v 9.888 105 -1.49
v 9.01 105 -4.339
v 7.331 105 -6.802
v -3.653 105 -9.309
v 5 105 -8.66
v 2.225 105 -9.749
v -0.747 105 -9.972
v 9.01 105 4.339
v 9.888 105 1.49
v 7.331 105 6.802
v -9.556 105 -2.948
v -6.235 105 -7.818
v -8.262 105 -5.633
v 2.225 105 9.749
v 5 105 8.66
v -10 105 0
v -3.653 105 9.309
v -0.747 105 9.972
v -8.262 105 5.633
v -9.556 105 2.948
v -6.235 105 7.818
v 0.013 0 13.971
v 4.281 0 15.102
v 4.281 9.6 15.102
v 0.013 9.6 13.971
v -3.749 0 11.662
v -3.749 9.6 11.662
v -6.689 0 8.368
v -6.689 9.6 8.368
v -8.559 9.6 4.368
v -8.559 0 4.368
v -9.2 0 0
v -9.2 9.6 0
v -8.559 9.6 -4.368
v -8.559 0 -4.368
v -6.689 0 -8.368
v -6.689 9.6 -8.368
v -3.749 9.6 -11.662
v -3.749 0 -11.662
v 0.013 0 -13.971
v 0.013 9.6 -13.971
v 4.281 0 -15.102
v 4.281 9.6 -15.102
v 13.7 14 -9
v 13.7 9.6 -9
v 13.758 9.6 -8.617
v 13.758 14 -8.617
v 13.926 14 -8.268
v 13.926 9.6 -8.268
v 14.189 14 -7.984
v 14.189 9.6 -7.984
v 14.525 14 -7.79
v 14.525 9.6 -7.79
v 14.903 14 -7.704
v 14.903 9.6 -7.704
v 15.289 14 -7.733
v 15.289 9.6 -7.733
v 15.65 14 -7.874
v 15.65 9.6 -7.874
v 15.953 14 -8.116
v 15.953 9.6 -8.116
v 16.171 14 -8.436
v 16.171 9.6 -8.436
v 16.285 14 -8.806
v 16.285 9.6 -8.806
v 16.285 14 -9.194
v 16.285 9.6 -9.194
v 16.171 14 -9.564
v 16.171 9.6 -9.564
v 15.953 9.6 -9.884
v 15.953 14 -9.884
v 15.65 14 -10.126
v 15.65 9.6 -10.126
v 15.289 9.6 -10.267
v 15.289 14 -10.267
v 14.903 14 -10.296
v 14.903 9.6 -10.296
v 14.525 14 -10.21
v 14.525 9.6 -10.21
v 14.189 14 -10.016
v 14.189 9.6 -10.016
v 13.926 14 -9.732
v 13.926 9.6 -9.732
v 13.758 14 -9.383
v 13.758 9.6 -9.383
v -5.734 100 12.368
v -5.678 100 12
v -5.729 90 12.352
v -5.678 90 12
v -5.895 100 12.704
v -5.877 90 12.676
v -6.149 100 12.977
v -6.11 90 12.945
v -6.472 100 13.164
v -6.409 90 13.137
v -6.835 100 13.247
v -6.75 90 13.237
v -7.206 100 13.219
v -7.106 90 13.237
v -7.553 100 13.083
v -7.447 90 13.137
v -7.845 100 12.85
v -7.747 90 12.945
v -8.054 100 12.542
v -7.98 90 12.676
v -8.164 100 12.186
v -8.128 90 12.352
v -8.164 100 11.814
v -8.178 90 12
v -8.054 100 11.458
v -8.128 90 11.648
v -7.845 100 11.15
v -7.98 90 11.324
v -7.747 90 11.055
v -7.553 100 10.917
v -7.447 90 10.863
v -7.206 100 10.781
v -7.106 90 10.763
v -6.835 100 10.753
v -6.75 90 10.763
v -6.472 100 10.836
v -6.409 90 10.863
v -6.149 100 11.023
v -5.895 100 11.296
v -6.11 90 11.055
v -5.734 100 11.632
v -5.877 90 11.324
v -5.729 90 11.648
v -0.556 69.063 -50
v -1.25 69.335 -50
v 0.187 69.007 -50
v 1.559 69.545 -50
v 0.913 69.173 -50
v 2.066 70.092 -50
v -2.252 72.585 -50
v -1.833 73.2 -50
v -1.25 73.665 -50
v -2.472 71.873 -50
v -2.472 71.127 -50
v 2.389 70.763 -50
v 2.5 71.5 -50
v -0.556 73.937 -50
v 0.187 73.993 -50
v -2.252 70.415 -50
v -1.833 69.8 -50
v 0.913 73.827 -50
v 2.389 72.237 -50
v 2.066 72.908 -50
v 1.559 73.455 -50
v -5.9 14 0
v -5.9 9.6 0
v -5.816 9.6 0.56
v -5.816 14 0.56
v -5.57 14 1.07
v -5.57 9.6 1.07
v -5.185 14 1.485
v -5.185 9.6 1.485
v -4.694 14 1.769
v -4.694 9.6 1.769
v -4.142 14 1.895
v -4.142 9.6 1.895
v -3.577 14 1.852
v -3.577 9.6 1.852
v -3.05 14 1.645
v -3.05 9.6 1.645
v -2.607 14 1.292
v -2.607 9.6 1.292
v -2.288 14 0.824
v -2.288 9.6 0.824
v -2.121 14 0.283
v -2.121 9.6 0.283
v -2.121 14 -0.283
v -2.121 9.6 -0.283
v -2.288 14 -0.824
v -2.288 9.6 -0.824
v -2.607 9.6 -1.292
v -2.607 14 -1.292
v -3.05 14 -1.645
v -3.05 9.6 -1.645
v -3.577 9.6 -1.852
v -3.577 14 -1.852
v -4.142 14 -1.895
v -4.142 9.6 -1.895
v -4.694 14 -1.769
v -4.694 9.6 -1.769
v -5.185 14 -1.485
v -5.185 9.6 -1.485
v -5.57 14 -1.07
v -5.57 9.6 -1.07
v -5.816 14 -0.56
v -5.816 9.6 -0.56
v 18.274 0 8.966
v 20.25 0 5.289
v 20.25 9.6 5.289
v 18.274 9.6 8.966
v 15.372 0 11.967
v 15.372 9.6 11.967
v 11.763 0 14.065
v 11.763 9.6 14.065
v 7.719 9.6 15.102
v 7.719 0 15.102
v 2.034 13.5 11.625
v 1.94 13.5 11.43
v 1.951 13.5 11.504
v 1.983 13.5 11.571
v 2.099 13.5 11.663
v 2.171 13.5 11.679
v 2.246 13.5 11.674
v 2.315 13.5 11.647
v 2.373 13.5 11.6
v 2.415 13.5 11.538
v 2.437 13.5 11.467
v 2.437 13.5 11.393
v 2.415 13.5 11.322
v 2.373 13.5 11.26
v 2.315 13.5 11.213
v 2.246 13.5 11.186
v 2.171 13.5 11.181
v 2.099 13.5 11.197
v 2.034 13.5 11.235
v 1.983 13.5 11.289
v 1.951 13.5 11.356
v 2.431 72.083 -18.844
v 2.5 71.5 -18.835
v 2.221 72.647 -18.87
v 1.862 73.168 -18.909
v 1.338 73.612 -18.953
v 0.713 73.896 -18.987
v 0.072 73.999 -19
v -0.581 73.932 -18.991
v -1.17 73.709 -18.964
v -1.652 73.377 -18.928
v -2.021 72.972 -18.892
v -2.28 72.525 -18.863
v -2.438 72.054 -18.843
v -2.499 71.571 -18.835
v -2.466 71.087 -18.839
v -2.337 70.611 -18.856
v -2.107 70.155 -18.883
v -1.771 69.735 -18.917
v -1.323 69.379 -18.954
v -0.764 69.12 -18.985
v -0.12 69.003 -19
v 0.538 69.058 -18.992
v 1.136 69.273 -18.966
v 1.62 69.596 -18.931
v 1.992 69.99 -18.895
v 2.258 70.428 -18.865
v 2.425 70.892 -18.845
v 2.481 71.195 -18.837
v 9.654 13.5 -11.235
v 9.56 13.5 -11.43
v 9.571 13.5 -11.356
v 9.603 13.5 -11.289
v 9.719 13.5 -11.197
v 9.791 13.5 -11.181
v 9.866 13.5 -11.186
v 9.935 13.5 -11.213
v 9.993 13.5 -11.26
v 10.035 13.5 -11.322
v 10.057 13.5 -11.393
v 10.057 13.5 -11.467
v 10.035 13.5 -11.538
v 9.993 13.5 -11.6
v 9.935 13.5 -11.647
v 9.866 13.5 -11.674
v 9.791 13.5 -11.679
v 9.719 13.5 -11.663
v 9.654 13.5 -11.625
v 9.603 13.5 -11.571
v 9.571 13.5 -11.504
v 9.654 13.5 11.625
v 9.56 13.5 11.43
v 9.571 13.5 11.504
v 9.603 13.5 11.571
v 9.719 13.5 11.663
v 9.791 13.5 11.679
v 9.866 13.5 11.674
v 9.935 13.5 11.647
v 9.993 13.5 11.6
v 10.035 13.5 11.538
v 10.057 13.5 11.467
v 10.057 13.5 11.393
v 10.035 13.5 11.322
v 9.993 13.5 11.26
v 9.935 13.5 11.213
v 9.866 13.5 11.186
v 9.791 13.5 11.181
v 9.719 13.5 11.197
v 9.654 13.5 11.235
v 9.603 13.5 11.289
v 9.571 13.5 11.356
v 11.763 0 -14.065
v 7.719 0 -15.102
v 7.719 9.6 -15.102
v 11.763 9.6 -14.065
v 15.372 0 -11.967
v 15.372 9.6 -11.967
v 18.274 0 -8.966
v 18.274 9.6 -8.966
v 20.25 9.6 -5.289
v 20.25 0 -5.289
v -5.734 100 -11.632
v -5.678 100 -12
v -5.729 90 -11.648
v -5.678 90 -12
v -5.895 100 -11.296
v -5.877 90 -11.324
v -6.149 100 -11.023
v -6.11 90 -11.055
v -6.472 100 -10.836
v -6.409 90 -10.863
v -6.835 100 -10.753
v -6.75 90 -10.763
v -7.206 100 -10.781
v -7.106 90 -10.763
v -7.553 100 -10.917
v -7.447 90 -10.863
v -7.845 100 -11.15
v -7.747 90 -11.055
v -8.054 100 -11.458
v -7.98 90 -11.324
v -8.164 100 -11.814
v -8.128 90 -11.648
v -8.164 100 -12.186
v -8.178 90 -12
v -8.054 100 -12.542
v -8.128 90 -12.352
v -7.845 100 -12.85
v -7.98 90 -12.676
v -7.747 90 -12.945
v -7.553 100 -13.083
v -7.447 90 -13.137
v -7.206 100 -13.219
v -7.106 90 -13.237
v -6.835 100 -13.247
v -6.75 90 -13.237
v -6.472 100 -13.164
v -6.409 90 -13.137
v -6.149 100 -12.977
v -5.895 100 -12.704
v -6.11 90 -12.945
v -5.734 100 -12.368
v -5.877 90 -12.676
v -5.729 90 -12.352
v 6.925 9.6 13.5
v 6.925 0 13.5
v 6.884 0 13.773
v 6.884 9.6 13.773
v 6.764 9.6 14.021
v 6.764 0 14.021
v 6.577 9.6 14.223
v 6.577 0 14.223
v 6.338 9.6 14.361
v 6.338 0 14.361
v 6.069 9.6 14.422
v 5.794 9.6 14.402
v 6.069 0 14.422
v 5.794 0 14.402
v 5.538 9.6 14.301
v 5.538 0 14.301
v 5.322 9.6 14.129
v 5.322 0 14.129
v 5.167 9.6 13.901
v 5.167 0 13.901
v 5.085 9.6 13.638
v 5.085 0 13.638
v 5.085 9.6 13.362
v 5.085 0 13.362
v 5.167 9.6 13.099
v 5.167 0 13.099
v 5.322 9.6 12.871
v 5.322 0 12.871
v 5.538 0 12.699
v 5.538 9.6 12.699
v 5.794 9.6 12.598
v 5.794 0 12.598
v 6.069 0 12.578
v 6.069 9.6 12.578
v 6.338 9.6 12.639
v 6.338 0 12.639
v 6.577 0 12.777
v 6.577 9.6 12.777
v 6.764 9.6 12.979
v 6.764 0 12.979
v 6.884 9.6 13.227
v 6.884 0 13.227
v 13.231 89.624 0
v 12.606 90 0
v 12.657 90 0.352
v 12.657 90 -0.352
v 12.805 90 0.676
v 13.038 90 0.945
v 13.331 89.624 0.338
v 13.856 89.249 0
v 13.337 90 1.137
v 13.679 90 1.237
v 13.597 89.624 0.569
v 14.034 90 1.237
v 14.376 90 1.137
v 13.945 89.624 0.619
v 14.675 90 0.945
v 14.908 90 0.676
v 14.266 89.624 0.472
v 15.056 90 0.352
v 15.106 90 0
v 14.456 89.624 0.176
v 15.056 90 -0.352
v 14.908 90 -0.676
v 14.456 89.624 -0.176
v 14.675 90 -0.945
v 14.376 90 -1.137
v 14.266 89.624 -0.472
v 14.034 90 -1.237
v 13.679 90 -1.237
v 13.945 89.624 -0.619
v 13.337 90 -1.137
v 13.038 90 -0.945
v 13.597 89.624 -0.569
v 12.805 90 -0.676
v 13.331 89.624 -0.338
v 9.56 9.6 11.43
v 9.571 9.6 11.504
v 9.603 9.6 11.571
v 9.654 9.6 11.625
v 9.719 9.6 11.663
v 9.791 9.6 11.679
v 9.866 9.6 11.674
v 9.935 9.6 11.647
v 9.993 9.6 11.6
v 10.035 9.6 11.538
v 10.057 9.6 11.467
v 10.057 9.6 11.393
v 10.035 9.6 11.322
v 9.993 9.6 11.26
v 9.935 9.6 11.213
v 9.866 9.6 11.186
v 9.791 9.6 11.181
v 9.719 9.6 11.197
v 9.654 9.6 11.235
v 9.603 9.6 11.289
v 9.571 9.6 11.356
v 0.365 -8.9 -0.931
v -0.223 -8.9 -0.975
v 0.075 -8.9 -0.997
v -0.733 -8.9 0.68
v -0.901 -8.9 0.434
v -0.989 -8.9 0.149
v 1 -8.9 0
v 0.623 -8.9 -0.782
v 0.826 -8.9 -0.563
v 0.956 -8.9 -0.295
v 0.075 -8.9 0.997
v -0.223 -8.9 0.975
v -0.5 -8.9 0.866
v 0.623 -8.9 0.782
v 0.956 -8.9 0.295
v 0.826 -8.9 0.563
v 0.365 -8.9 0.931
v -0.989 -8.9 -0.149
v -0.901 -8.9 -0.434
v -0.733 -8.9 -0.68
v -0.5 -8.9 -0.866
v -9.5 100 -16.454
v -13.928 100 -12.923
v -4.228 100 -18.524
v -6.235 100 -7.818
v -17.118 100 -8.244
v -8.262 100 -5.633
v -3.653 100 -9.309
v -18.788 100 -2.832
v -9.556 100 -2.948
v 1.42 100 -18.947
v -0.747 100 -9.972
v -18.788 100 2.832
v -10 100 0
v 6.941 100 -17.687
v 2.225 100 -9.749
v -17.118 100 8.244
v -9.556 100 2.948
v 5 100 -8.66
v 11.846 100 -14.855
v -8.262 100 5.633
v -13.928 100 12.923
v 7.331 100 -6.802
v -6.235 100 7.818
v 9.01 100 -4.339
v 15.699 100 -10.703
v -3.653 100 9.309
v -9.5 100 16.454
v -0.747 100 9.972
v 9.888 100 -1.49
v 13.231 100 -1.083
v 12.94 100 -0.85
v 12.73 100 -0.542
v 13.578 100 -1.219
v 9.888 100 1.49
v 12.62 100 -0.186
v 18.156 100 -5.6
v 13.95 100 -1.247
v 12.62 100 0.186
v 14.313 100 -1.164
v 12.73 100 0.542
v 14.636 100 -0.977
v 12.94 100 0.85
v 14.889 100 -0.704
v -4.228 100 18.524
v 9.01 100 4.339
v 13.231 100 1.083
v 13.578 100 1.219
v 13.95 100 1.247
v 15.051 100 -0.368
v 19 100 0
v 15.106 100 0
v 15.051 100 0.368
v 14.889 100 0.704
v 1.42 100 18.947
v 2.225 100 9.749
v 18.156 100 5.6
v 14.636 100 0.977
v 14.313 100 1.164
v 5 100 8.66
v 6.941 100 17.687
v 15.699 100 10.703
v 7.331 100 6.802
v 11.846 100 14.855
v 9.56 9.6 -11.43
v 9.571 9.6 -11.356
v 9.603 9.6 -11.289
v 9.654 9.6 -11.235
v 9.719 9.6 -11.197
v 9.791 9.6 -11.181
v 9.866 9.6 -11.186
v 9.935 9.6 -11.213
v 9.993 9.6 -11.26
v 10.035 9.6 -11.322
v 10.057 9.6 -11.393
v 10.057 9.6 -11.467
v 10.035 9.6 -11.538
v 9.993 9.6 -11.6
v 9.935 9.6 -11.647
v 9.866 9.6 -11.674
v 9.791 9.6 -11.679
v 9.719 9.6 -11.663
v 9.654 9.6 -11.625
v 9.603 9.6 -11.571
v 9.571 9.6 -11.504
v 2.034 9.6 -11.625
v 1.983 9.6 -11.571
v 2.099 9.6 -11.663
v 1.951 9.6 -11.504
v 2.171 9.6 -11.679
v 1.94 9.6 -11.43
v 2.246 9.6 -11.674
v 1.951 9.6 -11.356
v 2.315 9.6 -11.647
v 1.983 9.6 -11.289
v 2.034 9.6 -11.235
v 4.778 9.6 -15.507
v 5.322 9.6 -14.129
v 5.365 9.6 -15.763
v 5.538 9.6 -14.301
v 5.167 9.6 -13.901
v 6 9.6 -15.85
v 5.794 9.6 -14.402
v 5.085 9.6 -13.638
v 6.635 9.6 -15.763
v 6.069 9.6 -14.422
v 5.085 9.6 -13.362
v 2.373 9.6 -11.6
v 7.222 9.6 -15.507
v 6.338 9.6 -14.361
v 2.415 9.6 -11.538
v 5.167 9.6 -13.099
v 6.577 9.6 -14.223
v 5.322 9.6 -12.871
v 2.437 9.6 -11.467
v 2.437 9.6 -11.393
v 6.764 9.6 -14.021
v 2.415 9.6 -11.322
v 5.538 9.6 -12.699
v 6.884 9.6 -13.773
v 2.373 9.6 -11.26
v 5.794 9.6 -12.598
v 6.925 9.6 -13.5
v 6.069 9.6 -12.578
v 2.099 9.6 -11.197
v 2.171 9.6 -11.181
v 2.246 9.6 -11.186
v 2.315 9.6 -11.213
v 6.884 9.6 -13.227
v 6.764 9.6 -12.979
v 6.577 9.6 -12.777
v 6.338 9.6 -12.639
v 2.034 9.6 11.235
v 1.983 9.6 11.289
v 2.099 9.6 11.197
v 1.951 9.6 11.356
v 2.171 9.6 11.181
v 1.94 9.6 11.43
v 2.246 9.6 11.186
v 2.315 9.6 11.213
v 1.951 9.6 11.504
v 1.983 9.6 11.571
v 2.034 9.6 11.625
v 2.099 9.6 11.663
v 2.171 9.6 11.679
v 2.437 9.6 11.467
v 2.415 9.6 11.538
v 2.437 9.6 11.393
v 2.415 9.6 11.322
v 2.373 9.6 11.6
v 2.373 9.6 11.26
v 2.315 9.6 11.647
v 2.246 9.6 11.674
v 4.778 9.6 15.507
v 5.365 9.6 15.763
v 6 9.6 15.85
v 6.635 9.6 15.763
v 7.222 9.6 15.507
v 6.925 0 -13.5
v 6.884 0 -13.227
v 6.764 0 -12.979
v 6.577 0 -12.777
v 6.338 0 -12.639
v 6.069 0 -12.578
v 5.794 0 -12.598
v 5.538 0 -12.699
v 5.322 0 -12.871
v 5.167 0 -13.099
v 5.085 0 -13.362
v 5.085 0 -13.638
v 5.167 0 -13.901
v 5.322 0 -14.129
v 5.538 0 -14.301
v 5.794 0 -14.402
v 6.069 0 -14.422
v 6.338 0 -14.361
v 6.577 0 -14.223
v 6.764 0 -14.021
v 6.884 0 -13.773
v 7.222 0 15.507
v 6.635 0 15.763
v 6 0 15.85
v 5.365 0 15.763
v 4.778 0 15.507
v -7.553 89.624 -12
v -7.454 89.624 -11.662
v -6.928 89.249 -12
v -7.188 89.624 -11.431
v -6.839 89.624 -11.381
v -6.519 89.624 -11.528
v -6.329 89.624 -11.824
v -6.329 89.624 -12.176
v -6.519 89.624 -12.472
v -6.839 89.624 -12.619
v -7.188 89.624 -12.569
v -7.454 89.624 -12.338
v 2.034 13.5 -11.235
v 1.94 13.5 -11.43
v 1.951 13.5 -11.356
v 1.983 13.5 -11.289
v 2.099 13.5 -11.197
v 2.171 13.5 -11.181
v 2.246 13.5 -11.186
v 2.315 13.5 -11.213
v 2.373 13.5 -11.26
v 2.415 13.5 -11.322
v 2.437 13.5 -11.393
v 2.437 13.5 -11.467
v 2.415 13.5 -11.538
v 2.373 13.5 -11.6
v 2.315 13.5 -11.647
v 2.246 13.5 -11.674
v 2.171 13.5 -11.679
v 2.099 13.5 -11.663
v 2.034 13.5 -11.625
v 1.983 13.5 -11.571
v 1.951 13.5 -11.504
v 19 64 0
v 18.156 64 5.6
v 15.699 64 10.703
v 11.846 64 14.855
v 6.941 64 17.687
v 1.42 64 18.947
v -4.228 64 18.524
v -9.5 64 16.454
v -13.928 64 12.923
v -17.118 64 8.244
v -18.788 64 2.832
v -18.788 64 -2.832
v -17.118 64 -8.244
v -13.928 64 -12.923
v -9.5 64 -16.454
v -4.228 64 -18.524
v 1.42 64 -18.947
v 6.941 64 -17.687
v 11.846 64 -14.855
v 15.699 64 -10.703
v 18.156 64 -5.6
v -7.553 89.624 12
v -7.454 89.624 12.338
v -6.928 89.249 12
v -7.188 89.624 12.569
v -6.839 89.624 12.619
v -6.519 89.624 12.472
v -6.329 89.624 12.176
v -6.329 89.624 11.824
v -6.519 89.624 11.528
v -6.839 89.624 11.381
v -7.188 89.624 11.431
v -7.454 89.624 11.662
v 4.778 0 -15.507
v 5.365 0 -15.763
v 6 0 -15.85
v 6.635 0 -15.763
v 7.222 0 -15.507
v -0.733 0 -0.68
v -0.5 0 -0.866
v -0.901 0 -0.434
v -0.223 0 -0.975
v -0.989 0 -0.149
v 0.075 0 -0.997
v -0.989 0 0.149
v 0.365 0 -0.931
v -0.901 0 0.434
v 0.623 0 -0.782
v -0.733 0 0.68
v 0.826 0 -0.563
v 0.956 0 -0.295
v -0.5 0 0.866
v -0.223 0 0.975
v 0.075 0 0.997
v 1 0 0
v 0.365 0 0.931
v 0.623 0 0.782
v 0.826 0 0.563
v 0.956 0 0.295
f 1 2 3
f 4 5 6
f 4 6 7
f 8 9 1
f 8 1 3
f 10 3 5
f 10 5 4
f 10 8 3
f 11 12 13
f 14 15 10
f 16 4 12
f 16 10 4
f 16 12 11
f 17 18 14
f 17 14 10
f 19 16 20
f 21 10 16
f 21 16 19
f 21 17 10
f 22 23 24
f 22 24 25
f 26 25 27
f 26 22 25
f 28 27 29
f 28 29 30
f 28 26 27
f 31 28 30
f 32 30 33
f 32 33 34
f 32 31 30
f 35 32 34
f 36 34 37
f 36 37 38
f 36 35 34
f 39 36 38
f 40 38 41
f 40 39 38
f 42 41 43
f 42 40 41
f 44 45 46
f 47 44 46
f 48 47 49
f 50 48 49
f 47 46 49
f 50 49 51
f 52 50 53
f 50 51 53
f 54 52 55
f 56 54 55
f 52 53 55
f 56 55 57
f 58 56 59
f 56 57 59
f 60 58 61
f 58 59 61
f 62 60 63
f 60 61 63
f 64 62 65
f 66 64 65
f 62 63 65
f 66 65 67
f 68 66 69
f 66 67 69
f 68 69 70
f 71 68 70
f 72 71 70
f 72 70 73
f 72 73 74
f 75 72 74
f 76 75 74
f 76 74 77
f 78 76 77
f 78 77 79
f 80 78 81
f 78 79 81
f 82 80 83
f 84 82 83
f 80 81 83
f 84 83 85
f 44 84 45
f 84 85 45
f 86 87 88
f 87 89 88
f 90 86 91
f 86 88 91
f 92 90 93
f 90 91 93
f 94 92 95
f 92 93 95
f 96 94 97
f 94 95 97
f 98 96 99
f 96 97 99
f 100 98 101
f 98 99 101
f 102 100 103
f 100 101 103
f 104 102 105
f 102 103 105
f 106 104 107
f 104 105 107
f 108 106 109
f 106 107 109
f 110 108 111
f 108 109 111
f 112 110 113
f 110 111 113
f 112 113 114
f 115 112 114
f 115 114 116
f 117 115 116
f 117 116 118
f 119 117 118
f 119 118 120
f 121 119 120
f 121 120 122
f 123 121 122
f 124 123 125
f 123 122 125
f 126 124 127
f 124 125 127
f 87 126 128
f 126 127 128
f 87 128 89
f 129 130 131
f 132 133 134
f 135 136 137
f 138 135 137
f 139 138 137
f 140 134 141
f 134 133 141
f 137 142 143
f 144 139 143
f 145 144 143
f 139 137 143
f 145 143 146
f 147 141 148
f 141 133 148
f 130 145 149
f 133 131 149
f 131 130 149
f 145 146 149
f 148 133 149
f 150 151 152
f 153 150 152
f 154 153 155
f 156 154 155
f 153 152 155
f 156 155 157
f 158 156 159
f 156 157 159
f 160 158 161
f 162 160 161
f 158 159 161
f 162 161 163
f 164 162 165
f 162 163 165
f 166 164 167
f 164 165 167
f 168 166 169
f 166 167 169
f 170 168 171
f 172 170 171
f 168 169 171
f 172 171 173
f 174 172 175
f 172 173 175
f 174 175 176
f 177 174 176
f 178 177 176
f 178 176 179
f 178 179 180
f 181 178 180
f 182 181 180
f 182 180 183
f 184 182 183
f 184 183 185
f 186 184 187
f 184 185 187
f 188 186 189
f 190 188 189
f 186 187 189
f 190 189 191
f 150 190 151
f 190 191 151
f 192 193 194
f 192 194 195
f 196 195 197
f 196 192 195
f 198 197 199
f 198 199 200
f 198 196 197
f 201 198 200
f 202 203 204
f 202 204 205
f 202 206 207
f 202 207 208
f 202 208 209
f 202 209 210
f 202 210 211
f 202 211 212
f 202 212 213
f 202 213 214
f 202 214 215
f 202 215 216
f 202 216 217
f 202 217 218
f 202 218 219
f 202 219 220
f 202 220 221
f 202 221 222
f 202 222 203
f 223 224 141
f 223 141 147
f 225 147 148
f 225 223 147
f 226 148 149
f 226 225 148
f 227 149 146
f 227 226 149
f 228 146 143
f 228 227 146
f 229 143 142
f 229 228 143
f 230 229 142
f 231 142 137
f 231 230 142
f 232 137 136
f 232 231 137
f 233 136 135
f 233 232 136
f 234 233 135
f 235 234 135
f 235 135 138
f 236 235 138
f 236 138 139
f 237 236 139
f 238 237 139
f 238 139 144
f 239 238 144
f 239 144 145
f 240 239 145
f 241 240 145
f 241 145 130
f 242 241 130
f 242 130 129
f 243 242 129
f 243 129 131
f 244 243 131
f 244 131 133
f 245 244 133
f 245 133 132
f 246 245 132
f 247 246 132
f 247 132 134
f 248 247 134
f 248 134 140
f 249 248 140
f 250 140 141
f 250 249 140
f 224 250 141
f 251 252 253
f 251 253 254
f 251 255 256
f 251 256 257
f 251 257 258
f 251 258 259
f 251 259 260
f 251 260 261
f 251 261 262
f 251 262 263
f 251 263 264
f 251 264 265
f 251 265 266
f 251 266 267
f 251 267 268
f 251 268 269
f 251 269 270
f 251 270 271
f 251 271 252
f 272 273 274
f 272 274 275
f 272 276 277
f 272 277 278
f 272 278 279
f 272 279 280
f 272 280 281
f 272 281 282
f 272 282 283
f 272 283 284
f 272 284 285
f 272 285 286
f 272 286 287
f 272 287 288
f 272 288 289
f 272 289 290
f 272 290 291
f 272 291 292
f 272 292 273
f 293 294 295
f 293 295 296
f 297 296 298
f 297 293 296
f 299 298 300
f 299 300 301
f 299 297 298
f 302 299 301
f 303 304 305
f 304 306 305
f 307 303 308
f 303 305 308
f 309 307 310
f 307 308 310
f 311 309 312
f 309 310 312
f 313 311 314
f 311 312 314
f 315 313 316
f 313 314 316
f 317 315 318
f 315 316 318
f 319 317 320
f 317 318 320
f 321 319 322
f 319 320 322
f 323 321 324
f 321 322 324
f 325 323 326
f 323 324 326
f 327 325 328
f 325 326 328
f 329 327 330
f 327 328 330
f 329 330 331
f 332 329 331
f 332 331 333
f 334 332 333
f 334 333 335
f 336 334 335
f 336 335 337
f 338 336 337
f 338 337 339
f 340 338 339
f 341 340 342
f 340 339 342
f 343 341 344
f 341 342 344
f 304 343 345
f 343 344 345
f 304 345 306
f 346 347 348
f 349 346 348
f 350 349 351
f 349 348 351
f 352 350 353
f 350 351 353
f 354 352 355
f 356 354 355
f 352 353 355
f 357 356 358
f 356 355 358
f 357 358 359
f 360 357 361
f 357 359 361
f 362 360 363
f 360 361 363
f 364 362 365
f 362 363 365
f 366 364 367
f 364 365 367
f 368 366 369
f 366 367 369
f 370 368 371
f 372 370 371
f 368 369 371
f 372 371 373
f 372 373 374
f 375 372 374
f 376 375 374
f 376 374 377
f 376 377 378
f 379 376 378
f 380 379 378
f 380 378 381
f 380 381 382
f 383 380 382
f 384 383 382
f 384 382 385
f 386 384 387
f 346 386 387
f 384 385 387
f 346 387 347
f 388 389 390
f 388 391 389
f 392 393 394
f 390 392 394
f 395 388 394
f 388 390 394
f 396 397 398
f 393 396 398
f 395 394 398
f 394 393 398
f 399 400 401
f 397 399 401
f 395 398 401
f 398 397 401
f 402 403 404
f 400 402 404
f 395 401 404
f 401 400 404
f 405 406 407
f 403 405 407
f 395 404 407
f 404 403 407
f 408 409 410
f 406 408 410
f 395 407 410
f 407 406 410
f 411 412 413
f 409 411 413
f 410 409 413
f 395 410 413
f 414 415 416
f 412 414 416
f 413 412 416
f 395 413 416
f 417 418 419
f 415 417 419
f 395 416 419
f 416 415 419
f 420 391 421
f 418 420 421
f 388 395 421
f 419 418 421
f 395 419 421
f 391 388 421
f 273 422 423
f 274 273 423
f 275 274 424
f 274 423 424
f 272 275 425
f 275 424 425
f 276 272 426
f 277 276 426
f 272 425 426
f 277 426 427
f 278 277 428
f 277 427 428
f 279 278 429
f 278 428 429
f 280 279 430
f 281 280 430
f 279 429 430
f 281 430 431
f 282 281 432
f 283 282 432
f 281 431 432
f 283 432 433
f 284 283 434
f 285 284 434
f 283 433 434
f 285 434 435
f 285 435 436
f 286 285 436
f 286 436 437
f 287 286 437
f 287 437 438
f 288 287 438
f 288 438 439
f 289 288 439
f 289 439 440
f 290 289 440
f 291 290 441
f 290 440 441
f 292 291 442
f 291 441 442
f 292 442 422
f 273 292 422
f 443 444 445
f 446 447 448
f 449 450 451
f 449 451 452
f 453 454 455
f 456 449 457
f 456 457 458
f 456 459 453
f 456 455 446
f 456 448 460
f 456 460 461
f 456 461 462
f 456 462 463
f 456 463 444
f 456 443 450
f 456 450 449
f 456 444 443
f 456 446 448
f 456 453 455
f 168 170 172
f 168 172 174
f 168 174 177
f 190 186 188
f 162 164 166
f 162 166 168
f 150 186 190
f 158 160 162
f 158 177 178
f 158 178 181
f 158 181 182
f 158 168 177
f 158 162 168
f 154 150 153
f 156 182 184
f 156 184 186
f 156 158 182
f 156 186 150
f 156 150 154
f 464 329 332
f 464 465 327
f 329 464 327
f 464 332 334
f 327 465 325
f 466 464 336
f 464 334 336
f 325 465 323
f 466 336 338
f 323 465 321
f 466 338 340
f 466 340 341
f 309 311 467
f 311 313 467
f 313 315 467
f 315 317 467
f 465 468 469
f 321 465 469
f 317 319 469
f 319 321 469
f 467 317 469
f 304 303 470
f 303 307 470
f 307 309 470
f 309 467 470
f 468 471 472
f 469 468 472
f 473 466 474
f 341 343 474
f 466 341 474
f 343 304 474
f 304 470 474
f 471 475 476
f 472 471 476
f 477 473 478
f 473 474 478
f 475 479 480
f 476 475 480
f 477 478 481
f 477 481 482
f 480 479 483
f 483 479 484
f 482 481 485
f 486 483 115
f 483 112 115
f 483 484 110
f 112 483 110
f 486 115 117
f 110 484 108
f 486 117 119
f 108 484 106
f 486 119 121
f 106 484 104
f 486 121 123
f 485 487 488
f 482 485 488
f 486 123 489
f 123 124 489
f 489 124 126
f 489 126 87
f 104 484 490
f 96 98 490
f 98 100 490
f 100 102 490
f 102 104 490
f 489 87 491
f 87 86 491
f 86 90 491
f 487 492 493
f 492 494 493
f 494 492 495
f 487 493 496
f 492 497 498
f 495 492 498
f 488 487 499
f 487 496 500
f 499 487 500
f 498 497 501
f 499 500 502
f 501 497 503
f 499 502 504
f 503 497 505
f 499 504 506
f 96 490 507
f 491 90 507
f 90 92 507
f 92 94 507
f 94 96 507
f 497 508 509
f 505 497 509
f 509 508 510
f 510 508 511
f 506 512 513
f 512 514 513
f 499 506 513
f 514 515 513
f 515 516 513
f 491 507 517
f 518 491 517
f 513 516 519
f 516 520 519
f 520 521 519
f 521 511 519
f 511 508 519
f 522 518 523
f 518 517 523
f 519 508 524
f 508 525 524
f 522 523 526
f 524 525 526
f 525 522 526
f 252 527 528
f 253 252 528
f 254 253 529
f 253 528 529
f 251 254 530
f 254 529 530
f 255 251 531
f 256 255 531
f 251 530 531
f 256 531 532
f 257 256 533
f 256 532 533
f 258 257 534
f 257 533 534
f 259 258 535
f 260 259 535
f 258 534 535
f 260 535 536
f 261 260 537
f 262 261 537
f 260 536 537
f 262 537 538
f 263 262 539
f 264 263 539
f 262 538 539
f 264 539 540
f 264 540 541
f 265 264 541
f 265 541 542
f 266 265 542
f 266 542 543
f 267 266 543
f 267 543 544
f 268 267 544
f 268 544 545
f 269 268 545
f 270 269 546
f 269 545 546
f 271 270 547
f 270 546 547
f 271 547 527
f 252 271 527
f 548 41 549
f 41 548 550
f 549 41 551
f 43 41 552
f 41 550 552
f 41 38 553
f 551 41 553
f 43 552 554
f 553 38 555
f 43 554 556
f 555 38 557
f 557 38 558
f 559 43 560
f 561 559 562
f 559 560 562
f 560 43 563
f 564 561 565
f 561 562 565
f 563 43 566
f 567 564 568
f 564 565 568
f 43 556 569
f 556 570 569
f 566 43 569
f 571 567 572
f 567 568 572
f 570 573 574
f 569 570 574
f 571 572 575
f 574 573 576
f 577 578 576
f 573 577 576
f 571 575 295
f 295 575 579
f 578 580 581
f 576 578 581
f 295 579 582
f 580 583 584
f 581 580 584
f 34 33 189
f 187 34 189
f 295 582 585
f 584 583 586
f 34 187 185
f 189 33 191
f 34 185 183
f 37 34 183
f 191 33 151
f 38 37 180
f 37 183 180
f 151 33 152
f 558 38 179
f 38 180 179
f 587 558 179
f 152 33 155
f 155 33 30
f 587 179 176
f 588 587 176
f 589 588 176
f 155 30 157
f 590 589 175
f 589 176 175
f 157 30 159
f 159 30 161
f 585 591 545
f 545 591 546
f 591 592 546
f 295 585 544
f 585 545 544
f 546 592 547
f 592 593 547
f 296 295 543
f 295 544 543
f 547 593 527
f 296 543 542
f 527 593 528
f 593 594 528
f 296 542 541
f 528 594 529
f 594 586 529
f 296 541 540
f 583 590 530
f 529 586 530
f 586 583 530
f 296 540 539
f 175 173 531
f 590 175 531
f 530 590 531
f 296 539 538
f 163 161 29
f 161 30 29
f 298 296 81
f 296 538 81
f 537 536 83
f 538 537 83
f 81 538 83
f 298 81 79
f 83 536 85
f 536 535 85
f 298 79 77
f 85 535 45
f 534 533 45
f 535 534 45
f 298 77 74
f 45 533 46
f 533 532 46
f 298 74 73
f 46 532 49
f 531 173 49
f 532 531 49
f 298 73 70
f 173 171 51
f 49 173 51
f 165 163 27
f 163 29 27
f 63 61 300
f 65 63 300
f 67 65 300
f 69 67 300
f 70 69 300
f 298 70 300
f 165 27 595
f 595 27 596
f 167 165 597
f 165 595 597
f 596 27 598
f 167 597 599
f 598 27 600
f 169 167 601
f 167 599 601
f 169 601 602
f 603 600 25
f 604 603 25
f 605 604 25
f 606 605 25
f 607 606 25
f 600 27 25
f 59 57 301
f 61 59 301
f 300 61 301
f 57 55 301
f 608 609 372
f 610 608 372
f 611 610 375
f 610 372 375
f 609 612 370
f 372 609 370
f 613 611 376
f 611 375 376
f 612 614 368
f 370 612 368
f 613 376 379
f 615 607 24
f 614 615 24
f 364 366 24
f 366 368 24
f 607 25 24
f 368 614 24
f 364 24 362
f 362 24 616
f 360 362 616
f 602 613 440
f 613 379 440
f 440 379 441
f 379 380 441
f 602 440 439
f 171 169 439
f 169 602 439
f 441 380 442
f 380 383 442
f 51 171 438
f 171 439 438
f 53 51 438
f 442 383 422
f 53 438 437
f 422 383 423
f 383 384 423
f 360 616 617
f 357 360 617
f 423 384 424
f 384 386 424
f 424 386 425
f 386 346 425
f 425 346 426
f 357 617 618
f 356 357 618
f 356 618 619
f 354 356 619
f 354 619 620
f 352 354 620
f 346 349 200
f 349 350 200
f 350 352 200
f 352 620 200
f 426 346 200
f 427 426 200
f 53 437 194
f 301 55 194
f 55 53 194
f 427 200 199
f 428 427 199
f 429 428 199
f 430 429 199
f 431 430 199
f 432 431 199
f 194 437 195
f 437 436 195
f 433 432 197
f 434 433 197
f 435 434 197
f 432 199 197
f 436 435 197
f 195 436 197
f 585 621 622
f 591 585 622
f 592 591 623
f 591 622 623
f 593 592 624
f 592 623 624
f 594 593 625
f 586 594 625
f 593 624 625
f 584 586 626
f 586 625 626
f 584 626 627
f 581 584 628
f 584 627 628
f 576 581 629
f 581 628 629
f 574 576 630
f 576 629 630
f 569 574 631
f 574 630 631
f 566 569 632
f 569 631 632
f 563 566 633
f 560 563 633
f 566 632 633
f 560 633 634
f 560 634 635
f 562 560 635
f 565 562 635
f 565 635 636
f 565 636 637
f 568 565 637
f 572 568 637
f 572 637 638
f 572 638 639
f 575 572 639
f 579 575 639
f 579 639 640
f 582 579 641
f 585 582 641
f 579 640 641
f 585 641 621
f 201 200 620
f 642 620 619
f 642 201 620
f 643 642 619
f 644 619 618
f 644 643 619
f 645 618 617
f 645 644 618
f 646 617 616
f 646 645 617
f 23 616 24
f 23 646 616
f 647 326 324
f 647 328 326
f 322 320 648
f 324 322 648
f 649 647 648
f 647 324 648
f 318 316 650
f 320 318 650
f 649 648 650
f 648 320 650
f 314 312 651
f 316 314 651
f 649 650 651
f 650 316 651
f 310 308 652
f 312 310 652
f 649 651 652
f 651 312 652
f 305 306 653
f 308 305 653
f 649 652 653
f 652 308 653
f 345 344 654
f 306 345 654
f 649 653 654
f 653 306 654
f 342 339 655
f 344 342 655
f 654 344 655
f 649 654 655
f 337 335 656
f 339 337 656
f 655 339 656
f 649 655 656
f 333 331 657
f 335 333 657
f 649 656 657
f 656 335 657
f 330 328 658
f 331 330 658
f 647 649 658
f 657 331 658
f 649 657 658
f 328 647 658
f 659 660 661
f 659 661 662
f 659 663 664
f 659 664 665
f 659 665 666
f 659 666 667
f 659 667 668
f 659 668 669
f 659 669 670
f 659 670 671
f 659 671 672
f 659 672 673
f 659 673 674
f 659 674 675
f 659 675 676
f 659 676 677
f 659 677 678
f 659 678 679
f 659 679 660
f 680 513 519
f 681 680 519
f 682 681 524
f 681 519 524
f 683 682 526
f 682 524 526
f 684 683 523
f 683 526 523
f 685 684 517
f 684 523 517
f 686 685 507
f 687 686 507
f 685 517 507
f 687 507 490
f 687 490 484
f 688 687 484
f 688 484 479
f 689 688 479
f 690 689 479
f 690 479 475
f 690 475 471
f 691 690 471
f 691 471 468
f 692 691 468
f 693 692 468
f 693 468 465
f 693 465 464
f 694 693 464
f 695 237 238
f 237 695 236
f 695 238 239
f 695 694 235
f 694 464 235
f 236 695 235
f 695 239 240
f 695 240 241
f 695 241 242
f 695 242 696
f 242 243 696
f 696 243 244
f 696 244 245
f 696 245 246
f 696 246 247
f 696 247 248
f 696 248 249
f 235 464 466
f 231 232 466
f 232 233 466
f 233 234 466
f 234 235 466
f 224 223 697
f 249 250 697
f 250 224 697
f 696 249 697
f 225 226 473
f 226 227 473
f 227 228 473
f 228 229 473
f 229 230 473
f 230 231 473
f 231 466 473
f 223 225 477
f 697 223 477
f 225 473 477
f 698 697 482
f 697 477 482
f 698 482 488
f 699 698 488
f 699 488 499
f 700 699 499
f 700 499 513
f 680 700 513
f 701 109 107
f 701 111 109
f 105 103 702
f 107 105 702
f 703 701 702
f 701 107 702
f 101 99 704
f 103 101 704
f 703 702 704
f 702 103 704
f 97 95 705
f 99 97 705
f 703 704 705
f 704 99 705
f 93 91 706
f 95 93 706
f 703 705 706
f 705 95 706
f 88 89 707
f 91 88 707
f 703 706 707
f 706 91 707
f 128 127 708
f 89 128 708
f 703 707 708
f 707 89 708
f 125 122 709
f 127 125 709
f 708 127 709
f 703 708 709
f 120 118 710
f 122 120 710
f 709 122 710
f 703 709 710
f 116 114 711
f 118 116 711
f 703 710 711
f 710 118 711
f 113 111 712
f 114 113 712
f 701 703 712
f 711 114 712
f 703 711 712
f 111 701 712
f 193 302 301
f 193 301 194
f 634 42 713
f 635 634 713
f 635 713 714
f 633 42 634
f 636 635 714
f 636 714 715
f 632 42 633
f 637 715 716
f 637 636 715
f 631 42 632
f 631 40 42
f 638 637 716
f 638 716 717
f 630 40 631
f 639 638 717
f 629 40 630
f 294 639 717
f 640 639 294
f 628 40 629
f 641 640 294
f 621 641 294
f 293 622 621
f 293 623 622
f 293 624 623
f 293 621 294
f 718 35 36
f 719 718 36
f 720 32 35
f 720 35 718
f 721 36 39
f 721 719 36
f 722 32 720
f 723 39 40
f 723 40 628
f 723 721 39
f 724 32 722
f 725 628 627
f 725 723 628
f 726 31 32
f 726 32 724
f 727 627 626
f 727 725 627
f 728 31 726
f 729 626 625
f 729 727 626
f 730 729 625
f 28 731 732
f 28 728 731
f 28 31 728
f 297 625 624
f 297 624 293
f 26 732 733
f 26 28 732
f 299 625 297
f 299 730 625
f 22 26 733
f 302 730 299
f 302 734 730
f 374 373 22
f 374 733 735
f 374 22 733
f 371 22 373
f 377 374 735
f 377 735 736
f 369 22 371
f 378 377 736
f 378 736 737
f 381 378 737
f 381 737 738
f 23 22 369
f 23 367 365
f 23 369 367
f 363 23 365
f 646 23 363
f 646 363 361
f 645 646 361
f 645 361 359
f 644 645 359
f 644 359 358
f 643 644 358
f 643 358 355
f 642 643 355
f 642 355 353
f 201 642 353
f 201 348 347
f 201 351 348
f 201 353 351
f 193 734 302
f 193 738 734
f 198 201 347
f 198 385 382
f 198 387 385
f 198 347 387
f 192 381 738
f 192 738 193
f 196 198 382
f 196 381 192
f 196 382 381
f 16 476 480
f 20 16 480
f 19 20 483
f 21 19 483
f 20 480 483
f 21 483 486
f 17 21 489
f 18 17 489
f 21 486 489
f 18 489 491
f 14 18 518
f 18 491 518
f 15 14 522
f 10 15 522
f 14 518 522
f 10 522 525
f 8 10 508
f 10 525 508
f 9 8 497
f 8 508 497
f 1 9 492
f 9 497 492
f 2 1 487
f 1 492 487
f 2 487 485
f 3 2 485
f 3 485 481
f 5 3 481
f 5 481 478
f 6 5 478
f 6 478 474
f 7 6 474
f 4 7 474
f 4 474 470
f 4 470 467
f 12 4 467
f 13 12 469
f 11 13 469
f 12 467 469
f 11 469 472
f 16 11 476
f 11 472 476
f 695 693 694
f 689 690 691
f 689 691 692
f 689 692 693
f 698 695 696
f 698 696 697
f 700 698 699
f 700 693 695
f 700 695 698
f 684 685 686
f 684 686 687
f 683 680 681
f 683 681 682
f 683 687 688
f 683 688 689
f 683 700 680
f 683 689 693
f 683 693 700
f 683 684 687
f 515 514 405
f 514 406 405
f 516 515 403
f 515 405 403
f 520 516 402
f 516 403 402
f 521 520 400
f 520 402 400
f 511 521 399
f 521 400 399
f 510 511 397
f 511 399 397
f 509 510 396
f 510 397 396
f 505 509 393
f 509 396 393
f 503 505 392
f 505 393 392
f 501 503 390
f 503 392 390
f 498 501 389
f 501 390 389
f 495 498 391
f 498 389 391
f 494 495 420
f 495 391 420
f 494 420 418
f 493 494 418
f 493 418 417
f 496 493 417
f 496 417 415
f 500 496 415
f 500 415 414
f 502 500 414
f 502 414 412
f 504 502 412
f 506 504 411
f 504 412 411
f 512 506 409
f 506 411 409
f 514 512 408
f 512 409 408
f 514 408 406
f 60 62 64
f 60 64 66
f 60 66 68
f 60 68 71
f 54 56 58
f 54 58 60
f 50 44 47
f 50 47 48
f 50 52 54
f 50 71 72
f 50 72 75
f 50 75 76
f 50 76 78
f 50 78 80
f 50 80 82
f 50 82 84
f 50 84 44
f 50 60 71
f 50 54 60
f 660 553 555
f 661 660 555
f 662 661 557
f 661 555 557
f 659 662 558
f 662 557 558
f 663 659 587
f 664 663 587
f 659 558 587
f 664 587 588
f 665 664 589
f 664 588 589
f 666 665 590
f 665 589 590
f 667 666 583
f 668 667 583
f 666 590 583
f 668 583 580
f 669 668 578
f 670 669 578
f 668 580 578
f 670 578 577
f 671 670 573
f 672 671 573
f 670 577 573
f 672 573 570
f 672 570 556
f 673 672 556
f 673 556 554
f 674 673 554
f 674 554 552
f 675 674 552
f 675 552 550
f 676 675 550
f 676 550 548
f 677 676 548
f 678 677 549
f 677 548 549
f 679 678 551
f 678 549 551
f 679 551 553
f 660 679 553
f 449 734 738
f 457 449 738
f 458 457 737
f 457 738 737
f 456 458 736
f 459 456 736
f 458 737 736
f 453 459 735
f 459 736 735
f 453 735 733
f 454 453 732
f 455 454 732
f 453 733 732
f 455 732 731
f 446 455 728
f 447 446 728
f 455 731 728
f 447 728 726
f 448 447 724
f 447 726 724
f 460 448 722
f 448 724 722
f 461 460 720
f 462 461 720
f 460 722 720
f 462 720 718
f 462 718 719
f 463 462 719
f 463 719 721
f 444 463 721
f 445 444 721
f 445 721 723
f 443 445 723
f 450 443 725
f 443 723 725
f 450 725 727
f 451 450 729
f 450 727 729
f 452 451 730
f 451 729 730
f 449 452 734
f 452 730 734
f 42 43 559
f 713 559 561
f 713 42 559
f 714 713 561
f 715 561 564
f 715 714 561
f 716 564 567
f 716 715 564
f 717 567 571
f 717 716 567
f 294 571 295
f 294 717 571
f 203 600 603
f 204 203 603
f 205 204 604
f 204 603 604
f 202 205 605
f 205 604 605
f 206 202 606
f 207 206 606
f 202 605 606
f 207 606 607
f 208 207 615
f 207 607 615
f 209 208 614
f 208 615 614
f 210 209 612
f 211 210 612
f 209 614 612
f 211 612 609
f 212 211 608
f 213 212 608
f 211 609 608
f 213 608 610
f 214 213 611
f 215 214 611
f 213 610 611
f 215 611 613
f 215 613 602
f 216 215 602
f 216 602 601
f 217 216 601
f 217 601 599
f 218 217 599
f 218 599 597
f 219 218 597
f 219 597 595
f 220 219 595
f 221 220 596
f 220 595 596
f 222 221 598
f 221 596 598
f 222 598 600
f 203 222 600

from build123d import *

# Parameters (mm, degrees)
F1_R      = 19
F2_DEPTH  = 36
F3_R      = 10
F4_DEPTH  = 5
F5_D      = 2.5
F5_DEPTH  = 10
F5_TIP    = 0.7510757738
F6_R      = 2.5
F7_DEPTH  = 50
F8_R      = 1
F8_R_2    = 0.925
F9_DEPTH  = 9.6
F10_DEPTH = 8.9
F11_R     = 1.9
F11_R_2   = 1.3
F12_DEPTH = 4.4
F11_R_3   = 0.25
F13_DEPTH = 3.9


with BuildPart() as f2:
    # F1 (on offset) → F2 (new body)
    with BuildSketch(Plane.XZ.offset(-100)):
        Circle(F1_R)
    extrude(amount=F2_DEPTH)

    # F3 (on face) → F4 (join)
    with BuildSketch(Plane(origin=(0, 100, 0), x_dir=(-1, 0, 0), z_dir=(0, 1, 0))):
        Circle(F3_R)
    extrude(amount=F4_DEPTH)

    # F5
    with Locations(Plane(origin=(0, 100, 0), x_dir=(-1, 0, 0), z_dir=(0, 1, 0))):
        with Locations((-13.8564064606, 0), (6.9282032303, -12), (6.9282032303, 12)):
            Hole(F5_D / 2, depth=F5_DEPTH)
            with Locations((0, 0, -(F5_DEPTH + F5_TIP / 2))):  # 118° drill point
                Cone(0, F5_D / 2, F5_TIP, mode=Mode.SUBTRACT)

    # F6 (on Top) → F7 (join)
    with BuildSketch(Plane.XY):
        with Locations((0, 71.5)):
            Circle(F6_R)
    extrude(amount=-F7_DEPTH)


with BuildPart() as f9:
    # F8 (on Front) → F9 (new body)
    with BuildSketch(Plane.XZ):
        with BuildLine():
            Line((20.25, -5.2893761447), (20.25, 5.2893761447))
            ThreePointArc((20.25, 5.2893761447), (15.3715262902, 11.9672258687), (7.7188640871, 15.1025))
            ThreePointArc((7.7188640871, 15.1025), (8.1865304257, 14.3611531209), (8.35, 13.5))
            ThreePointArc((8.35, 13.5), (5.1388468791, 11.3134695743), (4.2811359129, 15.1025))
            ThreePointArc((4.2811359129, 15.1025), (-9.2, 0), (4.2811359129, -15.1025))
            ThreePointArc((4.2811359129, -15.1025), (5.1388468791, -11.3134695743), (8.35, -13.5))
            ThreePointArc((8.35, -13.5), (8.1865304257, -14.3611531209), (7.7188640871, -15.1025))
            ThreePointArc((7.7188640871, -15.1025), (15.3715262902, -11.9672258687), (20.25, -5.2893761447))
        make_face()
        Circle(F8_R, mode=Mode.SUBTRACT)
        with BuildLine():
            ThreePointArc((4.2811359129, 15.1025), (6, 15.2), (7.7188640871, 15.1025))
            ThreePointArc((7.7188640871, 15.1025), (6, 15.85), (4.2811359129, 15.1025))
        make_face()
        with BuildLine():
            ThreePointArc((8.35, 13.5), (8.1865304257, 14.3611531209), (7.7188640871, 15.1025))
            ThreePointArc((7.7188640871, 15.1025), (6, 15.2), (4.2811359129, 15.1025))
            ThreePointArc((4.2811359129, 15.1025), (5.1388468791, 11.3134695743), (8.35, 13.5))
        make_face()
        with Locations((6, 13.5)):
            Circle(F8_R_2, mode=Mode.SUBTRACT)
        with BuildLine():
            ThreePointArc((4.2811359129, -15.1025), (6, -15.2), (7.7188640871, -15.1025))
            ThreePointArc((7.7188640871, -15.1025), (8.1865304257, -14.3611531209), (8.35, -13.5))
            ThreePointArc((8.35, -13.5), (5.1388468791, -11.3134695743), (4.2811359129, -15.1025))
        make_face()
        with Locations((6, -13.5)):
            Circle(F8_R_2, mode=Mode.SUBTRACT)
        with BuildLine():
            ThreePointArc((4.2811359129, -15.1025), (6, -15.85), (7.7188640871, -15.1025))
            ThreePointArc((7.7188640871, -15.1025), (6, -15.2), (4.2811359129, -15.1025))
        make_face()
        Circle(F8_R)
    extrude(amount=-F9_DEPTH)

    # F8 (on Front) → F10 (join)
    with BuildSketch(Plane.XZ):
        Circle(F8_R)
    extrude(amount=F10_DEPTH)

    # F11 (on face) → F12 (join)
    with BuildSketch(Plane(origin=(0, 9.6, 0), x_dir=(-1, 0, 0), z_dir=(0, 1, 0))):
        with Locations((4, 0)):
            Circle(F11_R)
        with Locations((-15, -9)):
            Circle(F11_R_2)
    extrude(amount=F12_DEPTH)

    # F11 (on face) → F13 (join)
    with BuildSketch(Plane(origin=(0, 9.6, 0), x_dir=(-1, 0, 0), z_dir=(0, 1, 0))):
        with Locations((-9.81, 11.43)):
            Circle(F11_R_3)
        with Locations((-2.19, 11.43)):
            Circle(F11_R_3)
        with Locations((-2.19, -11.43)):
            Circle(F11_R_3)
        with Locations((-9.81, -11.43)):
            Circle(F11_R_3)
    extrude(amount=F13_DEPTH)


solid = Compound([f2.part, f9.part])
